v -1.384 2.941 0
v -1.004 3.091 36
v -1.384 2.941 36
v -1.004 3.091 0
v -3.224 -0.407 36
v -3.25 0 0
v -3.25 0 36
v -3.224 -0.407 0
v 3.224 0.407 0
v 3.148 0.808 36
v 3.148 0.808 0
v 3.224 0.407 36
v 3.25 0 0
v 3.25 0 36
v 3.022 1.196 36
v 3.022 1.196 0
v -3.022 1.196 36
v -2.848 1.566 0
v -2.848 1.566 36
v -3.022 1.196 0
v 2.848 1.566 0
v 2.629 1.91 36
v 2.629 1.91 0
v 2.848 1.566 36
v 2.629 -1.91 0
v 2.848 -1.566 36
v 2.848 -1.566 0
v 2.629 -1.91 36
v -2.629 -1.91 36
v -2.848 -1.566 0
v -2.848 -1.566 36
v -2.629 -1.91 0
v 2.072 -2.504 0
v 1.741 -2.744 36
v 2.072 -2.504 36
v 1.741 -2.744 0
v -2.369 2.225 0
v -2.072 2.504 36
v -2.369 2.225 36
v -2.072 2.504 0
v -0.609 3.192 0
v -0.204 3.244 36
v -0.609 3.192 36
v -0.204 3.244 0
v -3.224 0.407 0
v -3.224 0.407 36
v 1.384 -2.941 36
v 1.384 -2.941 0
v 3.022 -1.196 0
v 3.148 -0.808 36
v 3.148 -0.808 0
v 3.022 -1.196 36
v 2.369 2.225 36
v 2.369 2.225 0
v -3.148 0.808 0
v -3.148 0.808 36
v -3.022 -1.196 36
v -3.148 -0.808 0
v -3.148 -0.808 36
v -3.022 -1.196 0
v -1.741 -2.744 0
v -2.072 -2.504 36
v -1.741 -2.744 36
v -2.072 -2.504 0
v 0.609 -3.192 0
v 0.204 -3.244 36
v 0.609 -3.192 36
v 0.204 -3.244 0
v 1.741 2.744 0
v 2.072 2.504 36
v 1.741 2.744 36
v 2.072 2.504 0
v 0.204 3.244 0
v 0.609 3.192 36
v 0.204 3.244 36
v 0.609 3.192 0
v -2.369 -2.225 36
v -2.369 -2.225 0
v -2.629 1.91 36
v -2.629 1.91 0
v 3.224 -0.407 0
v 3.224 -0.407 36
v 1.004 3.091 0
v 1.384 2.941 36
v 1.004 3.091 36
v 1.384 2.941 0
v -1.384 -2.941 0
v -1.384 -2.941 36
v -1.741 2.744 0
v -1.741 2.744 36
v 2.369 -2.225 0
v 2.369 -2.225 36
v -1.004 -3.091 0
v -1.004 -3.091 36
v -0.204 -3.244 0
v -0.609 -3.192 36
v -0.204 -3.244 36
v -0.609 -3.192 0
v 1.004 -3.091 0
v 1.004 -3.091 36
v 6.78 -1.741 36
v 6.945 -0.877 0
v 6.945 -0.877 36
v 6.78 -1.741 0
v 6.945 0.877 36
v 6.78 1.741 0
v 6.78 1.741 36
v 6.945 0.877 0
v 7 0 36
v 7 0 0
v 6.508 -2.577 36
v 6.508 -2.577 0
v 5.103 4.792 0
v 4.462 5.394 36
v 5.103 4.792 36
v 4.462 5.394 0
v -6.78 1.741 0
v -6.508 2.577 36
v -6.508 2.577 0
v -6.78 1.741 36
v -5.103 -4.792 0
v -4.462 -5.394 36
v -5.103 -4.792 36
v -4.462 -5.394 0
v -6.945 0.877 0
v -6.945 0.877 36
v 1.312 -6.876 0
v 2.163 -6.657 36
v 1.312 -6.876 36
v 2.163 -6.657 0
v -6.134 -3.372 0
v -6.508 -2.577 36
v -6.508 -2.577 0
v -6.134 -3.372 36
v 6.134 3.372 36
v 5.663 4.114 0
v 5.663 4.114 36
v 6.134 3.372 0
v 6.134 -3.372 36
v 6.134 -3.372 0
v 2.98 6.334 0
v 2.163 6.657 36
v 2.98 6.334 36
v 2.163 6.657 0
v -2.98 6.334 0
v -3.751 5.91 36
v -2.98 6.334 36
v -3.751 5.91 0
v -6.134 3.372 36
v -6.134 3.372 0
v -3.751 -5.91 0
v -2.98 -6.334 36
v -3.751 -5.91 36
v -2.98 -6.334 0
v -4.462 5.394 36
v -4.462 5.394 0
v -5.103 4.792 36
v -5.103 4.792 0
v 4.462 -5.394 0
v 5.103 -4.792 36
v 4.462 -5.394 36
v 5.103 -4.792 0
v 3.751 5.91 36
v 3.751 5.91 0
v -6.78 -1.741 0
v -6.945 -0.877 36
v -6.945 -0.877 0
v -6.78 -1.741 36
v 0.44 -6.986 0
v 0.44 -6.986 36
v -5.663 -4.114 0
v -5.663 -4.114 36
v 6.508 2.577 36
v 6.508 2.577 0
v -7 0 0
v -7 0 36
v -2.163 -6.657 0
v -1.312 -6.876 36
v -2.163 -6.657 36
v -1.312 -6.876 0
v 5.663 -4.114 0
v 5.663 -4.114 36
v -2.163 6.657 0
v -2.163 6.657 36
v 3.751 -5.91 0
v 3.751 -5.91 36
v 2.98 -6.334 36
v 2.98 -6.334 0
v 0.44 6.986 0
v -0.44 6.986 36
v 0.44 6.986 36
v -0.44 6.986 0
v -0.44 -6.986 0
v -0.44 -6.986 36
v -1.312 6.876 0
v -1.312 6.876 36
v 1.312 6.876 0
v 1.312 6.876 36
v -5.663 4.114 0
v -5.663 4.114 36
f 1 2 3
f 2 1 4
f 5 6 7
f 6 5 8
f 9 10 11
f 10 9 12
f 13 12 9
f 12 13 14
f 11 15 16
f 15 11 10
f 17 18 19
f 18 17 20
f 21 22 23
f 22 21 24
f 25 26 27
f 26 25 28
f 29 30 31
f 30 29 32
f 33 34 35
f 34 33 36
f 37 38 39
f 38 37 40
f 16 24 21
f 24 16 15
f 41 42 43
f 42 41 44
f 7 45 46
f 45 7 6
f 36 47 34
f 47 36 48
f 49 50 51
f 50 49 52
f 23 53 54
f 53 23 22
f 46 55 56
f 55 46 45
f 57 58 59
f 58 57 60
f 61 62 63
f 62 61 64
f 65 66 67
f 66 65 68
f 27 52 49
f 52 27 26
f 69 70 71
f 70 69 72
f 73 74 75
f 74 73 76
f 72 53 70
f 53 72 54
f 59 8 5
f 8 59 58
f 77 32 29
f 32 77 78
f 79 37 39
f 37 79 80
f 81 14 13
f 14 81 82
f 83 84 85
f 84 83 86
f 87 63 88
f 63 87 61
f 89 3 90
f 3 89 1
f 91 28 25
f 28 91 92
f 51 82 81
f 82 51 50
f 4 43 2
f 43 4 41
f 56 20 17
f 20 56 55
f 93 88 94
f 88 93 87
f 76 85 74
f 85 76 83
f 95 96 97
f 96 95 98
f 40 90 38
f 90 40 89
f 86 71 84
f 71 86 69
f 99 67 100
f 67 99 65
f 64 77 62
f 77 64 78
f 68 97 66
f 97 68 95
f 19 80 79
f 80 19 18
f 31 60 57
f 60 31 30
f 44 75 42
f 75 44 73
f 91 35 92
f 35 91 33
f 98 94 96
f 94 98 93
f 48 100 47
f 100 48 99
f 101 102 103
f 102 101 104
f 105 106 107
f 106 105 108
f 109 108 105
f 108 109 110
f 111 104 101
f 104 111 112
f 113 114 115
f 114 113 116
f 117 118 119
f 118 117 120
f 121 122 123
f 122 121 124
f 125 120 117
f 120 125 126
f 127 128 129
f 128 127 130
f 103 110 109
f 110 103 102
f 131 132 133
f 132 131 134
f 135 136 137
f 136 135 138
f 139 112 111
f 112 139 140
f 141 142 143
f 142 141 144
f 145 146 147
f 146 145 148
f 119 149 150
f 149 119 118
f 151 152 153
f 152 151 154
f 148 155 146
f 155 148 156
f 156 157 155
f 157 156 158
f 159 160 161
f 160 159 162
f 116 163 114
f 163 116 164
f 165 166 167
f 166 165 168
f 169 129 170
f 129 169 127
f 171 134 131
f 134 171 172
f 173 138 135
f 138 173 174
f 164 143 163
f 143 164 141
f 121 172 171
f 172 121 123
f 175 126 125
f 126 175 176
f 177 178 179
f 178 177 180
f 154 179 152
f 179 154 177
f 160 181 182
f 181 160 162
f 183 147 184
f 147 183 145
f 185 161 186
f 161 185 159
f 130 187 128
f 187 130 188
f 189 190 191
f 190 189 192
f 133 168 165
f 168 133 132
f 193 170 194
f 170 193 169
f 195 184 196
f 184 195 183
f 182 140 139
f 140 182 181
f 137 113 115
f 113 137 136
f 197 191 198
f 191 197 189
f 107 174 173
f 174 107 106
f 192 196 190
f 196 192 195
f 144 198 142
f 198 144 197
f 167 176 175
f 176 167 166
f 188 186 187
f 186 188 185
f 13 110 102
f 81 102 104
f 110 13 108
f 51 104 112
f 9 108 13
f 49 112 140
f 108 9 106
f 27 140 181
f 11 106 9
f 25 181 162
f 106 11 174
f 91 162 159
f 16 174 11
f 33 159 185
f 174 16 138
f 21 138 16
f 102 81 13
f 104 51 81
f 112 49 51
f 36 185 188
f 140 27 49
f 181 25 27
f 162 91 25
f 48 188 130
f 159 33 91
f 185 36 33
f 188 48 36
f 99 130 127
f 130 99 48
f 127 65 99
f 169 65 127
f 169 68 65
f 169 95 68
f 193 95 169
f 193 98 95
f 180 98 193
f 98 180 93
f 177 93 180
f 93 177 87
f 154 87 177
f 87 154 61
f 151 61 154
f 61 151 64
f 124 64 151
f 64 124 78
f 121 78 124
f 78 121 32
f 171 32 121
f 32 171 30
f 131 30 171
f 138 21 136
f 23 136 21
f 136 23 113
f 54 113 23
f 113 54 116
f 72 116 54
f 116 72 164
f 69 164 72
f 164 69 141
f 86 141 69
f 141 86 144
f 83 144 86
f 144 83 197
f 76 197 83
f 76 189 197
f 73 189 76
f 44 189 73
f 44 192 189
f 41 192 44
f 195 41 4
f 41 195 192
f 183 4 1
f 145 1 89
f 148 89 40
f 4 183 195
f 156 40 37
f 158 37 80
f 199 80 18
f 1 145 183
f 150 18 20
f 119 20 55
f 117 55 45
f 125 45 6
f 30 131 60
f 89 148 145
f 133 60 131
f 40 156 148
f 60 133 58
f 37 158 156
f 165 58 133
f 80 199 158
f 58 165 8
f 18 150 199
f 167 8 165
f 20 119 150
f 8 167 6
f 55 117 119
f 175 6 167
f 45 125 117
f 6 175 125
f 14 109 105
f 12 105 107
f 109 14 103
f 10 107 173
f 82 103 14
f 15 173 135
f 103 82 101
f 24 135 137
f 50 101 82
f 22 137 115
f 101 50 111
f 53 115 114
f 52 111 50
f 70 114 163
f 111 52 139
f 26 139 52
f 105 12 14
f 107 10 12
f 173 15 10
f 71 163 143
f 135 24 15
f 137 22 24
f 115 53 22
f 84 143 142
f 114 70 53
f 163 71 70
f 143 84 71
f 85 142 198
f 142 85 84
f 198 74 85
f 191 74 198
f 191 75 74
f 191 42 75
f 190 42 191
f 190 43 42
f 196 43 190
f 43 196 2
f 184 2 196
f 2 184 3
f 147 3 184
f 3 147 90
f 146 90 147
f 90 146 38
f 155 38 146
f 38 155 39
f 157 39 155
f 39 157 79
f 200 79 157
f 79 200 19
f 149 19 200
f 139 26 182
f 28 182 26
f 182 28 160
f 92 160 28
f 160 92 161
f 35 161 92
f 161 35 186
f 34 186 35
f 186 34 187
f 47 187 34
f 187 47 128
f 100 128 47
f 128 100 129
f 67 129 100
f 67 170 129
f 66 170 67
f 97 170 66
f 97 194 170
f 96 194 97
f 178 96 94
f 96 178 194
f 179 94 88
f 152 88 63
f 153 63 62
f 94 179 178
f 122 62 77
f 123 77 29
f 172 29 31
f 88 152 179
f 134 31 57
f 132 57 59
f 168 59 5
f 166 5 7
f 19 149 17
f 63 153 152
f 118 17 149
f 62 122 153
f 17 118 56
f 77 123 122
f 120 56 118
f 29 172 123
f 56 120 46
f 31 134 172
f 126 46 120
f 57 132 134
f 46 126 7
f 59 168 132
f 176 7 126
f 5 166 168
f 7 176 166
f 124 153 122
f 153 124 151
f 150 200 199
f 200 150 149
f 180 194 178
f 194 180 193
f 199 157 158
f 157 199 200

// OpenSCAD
$fn = 50;


difference() {
	union() {
		cylinder(h = 36, r = 7.0000000000);
	}
	union() {
		translate(v = [0.0000000000, 0.0000000000, -100.0000000000]) {
			cylinder(h = 200, r = 3.2500000000);
		}
		cylinder(h = 36, r = 1.8000000000);
		cylinder(h = 36, r = 1.8000000000);
		cylinder(h = 36, r = 1.8000000000);
	}
}
